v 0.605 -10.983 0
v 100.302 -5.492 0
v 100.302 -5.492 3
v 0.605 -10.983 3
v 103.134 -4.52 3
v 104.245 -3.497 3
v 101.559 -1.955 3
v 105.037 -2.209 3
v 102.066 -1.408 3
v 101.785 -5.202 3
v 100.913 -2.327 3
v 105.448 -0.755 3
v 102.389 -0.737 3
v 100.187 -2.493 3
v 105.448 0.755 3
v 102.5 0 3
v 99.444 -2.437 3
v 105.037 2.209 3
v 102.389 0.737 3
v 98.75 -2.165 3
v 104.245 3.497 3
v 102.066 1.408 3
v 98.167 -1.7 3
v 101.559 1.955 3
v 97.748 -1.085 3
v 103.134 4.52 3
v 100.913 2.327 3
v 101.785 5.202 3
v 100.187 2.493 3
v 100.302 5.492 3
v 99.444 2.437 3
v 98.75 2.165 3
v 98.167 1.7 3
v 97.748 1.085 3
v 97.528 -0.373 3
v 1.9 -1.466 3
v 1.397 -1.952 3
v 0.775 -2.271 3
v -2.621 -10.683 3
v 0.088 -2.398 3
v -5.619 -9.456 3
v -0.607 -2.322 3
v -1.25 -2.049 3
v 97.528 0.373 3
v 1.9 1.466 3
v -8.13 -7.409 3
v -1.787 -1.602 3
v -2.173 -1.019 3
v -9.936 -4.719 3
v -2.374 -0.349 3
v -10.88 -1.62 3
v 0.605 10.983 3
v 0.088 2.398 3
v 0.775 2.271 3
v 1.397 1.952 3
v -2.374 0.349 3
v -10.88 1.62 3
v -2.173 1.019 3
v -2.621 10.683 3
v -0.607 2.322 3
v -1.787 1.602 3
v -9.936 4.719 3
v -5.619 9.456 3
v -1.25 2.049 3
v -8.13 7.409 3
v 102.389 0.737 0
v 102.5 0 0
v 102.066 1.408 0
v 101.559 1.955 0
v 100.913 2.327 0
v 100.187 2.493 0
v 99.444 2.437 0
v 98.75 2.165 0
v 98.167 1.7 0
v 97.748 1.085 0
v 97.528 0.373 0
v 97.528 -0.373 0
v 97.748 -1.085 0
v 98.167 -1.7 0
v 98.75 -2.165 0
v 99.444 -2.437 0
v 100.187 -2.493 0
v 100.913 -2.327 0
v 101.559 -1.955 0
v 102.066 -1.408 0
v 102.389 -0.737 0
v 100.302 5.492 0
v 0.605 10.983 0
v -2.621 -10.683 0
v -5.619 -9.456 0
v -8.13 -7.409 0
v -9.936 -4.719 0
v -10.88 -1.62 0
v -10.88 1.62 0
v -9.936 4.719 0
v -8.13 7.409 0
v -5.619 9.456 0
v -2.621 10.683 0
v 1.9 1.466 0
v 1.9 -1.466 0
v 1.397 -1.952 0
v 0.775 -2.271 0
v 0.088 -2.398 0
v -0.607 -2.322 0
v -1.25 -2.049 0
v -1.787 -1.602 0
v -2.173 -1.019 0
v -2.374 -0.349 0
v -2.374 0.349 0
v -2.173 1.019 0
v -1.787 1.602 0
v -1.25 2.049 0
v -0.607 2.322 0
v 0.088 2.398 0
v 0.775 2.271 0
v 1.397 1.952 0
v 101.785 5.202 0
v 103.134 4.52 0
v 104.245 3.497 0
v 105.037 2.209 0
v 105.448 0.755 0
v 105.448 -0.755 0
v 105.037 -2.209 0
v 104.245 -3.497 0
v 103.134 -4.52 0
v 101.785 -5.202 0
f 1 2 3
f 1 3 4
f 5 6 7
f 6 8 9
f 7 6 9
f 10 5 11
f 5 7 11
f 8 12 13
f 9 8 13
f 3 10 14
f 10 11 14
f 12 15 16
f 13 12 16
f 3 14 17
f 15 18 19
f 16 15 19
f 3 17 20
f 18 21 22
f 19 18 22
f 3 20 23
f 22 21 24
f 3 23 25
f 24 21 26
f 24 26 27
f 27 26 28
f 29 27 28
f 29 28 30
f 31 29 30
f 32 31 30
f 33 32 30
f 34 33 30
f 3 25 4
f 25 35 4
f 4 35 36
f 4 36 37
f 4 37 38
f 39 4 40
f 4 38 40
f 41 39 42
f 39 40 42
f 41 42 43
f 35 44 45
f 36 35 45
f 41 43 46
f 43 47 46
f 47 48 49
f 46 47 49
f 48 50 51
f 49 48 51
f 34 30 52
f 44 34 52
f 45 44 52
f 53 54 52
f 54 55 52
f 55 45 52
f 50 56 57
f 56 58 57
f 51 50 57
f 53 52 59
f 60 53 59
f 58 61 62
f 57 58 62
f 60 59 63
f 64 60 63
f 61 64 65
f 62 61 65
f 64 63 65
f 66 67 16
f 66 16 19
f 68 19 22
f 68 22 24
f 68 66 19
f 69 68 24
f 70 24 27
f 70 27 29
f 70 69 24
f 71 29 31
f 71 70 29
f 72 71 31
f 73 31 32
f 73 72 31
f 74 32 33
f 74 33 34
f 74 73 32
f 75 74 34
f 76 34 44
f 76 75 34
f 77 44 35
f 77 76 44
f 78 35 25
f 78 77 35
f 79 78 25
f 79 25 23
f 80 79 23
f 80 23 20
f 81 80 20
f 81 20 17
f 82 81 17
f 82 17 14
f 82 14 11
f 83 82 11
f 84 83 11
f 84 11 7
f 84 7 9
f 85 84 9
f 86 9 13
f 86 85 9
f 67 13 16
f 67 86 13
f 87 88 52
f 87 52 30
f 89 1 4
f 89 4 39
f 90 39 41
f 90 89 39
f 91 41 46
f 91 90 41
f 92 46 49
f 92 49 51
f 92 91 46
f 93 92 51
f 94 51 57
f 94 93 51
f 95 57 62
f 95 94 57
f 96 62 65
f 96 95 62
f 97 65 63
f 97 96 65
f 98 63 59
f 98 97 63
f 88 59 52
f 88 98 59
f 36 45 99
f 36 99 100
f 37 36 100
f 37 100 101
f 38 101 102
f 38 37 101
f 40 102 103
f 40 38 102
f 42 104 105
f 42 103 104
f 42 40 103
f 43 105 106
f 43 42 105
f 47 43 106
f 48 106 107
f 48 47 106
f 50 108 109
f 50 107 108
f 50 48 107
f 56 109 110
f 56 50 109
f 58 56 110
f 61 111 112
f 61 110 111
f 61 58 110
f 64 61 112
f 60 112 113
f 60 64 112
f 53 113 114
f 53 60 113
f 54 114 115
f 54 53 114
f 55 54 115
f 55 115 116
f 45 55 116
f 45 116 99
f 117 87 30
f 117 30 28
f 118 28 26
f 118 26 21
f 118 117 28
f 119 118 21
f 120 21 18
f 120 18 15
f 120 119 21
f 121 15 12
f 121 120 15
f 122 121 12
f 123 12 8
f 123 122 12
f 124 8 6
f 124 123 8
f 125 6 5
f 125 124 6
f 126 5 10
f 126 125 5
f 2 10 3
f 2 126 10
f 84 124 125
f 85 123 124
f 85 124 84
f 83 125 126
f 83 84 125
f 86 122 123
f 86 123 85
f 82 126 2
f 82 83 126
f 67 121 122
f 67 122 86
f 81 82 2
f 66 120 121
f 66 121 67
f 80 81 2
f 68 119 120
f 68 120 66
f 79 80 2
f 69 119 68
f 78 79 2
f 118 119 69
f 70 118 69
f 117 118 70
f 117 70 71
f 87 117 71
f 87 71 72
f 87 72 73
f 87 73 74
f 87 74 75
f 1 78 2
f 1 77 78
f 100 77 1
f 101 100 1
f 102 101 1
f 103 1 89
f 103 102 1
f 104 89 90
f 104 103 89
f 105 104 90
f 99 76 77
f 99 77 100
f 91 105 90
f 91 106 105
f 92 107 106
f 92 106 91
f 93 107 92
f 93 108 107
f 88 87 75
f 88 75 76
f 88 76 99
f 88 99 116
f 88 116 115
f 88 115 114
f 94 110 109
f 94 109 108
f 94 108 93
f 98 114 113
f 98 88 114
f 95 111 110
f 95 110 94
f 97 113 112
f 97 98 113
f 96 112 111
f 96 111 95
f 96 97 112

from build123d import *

# Parameters (mm, degrees)
SKETCH1_R           = 2.5
BOSS_EXTRUDE1_DEPTH = 3
CUT_EXTRUDE1_DEPTH  = 4


with BuildPart() as part:
    # Sketch1 → Boss-Extrude1 (new body)
    with BuildSketch(Plane.XY):
        with BuildLine():
            Line((0.605, 10.983349899), (100.3025, 5.491674949))
            ThreePointArc((100.3025, 5.491674949), (105.5, 0), (100.3025, -5.491674949))
            Line((100.3025, -5.491674949), (0.605, -10.983349899))
            ThreePointArc((0.605, -10.983349899), (-11, 0), (0.605, 10.983349899))
        make_face()
        with Locations((100, 0)):
            Circle(SKETCH1_R, mode=Mode.SUBTRACT)
    extrude(amount=BOSS_EXTRUDE1_DEPTH)

    # Sketch2 → Cut-Extrude1 (cut, through all)
    with BuildSketch(Plane.XY.offset(3)):
        with BuildLine():
            Line((1.9, 1.46628783), (1.9, -1.46628783))
            ThreePointArc((1.9, -1.46628783), (-2.4, 0), (1.9, 1.46628783))
        make_face()
    extrude(amount=-CUT_EXTRUDE1_DEPTH, mode=Mode.SUBTRACT)


solid = part.part
